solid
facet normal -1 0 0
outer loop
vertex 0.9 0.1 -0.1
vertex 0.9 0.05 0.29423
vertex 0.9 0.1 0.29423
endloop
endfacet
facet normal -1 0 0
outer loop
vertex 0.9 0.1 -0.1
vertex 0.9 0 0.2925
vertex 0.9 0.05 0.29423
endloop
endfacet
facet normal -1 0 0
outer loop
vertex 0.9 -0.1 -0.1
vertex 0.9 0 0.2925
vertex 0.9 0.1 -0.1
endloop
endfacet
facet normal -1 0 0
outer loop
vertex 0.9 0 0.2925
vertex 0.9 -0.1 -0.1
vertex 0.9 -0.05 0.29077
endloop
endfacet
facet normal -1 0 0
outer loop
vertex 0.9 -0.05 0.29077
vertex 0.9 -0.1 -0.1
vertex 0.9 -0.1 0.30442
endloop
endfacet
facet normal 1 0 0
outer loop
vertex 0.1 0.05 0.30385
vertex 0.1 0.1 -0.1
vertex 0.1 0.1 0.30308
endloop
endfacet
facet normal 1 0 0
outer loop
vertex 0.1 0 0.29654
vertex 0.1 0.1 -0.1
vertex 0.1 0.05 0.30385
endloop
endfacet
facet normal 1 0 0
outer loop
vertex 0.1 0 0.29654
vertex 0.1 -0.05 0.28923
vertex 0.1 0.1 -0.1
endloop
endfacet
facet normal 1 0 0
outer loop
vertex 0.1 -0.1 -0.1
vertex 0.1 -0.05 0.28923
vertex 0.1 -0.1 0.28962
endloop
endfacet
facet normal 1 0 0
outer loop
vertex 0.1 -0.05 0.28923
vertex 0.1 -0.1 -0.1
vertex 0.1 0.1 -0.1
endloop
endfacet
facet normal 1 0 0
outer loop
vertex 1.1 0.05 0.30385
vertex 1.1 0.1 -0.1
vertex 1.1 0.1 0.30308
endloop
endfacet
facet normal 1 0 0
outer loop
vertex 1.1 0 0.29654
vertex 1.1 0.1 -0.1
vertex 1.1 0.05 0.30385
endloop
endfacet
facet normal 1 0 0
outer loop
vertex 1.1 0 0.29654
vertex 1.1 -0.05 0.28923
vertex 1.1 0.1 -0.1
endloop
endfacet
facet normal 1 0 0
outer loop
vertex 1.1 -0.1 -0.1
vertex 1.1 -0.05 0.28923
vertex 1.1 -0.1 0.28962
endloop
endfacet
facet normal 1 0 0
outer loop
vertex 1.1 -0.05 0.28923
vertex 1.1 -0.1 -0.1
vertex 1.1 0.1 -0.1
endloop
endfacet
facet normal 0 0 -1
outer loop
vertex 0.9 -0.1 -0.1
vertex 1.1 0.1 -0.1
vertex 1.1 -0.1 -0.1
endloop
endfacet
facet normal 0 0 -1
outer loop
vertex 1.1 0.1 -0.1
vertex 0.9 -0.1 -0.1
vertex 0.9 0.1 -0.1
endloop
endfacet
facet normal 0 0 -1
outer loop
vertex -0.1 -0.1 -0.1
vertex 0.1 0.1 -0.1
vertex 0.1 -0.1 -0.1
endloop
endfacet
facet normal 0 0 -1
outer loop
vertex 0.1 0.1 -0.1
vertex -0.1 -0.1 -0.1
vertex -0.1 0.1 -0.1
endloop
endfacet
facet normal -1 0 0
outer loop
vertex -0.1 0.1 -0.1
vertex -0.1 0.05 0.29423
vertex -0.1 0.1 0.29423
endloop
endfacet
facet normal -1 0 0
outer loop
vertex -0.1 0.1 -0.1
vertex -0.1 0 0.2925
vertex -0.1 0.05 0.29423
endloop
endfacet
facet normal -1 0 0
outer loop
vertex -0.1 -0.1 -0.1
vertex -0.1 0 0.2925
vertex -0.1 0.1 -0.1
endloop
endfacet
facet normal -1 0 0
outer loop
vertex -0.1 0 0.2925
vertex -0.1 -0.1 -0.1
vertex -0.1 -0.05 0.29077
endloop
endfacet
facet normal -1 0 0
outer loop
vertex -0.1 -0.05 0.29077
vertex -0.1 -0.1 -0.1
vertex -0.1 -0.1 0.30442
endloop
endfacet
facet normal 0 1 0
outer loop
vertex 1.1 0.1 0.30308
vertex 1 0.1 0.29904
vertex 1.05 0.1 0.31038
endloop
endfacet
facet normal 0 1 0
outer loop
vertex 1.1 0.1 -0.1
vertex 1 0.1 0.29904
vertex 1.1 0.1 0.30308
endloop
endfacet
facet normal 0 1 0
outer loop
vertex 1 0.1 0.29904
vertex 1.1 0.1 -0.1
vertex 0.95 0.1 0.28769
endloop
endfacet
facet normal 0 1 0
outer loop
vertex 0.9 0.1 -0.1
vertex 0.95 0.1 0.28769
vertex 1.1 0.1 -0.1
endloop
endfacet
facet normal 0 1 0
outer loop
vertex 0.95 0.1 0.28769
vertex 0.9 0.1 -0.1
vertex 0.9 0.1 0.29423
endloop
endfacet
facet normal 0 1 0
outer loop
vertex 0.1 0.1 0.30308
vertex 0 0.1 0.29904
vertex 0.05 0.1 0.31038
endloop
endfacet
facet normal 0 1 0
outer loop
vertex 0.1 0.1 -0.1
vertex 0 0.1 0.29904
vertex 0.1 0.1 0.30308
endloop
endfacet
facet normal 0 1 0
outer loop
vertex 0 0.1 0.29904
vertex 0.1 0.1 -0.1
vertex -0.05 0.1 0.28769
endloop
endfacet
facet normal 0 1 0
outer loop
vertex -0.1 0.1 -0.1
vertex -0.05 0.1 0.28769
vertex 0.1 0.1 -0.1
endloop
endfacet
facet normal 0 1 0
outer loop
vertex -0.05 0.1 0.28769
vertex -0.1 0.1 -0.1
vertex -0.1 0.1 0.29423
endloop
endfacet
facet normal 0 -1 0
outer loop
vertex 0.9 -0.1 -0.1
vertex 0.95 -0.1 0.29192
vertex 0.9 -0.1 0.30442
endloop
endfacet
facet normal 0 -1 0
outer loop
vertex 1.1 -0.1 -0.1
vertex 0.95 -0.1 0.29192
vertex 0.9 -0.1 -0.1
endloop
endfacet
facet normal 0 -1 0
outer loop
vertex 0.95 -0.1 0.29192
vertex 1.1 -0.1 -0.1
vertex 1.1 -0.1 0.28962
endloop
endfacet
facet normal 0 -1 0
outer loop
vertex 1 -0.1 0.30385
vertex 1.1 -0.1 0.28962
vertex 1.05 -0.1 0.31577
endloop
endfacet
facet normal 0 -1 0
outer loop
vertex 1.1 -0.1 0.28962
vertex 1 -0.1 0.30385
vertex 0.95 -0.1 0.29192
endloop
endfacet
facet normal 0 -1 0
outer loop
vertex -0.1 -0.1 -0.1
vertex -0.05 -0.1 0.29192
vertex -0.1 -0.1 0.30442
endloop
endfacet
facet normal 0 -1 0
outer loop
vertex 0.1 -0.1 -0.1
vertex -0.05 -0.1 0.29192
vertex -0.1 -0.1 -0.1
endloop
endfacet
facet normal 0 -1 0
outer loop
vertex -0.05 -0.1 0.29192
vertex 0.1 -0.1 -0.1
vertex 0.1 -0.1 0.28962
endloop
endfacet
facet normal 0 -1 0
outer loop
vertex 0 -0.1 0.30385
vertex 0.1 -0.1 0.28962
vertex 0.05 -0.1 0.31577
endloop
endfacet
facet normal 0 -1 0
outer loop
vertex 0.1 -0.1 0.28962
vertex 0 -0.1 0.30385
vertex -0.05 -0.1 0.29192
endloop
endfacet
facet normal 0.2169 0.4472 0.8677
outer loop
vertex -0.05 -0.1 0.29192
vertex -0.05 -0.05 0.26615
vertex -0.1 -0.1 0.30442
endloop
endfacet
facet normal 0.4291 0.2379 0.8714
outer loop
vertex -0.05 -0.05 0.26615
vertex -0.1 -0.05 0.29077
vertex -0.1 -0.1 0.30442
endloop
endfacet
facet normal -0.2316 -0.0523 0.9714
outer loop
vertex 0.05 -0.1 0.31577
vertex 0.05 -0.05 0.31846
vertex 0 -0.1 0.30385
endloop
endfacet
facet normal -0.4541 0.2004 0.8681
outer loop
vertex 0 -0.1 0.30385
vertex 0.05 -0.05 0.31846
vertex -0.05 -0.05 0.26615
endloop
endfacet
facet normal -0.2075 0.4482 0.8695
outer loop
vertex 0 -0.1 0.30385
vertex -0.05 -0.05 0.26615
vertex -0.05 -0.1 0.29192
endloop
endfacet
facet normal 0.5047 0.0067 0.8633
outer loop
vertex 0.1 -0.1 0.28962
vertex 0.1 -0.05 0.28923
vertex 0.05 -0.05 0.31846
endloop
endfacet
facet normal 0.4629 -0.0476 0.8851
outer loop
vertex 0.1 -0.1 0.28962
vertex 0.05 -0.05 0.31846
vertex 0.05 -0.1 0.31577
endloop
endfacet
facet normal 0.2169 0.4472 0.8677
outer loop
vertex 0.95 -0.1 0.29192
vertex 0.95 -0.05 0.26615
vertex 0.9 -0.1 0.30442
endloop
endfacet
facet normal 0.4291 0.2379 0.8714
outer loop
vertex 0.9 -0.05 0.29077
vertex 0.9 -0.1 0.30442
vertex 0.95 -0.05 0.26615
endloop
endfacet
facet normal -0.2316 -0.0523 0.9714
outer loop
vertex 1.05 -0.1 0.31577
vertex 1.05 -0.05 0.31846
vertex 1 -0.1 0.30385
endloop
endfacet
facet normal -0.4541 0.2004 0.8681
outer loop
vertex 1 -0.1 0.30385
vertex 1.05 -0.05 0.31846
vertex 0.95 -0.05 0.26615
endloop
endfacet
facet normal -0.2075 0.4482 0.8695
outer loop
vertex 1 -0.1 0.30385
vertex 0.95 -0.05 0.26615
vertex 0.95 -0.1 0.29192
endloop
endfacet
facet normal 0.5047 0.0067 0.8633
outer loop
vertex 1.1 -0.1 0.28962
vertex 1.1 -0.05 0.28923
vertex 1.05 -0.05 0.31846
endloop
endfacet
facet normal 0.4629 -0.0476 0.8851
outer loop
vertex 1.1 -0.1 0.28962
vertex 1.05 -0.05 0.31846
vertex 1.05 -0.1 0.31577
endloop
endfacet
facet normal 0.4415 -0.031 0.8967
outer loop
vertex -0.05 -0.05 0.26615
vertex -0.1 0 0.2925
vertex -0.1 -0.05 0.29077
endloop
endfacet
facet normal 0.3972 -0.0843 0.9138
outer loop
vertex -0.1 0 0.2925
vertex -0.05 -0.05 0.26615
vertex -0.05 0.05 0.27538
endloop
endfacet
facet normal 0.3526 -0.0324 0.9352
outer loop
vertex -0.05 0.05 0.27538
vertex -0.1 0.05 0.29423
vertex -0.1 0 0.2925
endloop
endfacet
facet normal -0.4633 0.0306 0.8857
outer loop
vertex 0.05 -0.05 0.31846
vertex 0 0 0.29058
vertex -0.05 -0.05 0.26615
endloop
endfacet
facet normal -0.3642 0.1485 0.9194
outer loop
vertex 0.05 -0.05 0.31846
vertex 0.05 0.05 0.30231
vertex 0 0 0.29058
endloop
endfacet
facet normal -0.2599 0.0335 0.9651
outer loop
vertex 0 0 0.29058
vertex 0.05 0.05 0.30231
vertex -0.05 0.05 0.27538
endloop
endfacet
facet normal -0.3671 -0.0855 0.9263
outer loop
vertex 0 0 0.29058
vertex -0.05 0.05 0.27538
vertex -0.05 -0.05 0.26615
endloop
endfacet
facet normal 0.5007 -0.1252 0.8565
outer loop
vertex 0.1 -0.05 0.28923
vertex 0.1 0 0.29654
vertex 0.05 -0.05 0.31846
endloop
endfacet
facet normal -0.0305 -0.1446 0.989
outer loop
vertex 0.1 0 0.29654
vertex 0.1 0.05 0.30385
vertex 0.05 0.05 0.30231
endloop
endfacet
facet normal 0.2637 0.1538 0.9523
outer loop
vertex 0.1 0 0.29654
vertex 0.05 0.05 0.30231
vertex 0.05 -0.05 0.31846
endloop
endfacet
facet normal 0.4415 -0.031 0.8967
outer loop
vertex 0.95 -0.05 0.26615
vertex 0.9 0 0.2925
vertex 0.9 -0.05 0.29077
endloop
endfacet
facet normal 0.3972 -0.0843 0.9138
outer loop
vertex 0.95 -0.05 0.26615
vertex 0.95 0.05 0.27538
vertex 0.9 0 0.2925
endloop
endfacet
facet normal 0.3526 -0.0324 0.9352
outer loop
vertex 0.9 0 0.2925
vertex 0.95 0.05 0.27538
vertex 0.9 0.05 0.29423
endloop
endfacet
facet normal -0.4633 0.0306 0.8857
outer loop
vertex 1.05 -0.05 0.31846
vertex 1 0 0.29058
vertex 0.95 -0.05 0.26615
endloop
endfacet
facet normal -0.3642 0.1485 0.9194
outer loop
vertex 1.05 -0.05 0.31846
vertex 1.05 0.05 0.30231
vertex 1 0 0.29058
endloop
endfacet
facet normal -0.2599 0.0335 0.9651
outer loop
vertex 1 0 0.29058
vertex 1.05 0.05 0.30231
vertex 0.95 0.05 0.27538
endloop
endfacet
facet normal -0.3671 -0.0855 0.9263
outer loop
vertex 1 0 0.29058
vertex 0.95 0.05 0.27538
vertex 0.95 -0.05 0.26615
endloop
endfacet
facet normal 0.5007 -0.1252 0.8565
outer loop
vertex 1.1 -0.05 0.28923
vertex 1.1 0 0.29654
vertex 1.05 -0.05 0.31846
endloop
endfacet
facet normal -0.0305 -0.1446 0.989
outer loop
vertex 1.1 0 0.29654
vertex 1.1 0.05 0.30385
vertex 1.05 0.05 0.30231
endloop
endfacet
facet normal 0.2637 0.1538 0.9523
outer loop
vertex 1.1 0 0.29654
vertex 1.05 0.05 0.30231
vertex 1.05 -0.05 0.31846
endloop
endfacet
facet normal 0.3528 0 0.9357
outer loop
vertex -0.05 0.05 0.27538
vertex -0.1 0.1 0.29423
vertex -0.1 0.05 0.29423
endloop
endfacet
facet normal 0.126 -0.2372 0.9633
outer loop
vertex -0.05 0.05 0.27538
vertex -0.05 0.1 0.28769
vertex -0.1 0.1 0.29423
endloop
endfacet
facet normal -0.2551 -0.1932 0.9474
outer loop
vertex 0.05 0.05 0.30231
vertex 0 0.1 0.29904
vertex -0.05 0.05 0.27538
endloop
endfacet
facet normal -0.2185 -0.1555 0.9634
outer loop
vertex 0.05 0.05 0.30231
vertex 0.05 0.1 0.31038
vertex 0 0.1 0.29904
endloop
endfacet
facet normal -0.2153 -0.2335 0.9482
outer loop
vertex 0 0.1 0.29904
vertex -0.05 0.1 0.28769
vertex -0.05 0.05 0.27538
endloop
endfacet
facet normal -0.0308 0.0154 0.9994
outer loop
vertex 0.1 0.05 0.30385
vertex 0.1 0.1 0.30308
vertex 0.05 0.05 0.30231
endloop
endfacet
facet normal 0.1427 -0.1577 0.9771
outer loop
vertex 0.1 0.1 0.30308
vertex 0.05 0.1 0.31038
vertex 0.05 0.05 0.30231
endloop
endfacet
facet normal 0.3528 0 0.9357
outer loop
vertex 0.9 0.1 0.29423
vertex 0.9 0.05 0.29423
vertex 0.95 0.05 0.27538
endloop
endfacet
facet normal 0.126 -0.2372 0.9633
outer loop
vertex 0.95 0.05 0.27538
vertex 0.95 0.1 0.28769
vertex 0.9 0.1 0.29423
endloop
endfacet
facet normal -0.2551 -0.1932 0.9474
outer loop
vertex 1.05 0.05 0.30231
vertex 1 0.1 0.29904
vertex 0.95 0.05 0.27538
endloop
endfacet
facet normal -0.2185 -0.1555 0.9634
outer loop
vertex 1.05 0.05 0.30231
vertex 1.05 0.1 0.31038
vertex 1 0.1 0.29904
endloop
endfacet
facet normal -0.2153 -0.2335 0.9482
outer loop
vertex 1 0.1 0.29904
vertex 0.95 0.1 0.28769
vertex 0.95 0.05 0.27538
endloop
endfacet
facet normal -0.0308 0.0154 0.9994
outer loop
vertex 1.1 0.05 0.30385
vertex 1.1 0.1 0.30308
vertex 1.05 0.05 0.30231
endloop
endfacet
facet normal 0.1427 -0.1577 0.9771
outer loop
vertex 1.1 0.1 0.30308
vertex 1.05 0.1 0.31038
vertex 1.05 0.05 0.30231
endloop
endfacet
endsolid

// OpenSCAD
intersection() {
    color([0.3, 0.3, 0.5])
    difference() {
        translate([-0.1,-0.1,-0.1])
        cube([1.2, .2, 1.2], false);

        
        rotate([90, 0, 0])
        {
            translate([.5, .4, 0]) 
            cylinder(.3, .4, .4, center = true,
                     $fn=30);
            translate([.5, 0, 0])
            cube([.8, .8, .3], center = true);
            
        }

    }
    translate([-.15,-.15,.25])
    scale([1/10,1/10, 1/13])
    union() {
        surface("jagged.dat");
        translate([0,0,-13])
        cube([13,13,13]);
    }
}
